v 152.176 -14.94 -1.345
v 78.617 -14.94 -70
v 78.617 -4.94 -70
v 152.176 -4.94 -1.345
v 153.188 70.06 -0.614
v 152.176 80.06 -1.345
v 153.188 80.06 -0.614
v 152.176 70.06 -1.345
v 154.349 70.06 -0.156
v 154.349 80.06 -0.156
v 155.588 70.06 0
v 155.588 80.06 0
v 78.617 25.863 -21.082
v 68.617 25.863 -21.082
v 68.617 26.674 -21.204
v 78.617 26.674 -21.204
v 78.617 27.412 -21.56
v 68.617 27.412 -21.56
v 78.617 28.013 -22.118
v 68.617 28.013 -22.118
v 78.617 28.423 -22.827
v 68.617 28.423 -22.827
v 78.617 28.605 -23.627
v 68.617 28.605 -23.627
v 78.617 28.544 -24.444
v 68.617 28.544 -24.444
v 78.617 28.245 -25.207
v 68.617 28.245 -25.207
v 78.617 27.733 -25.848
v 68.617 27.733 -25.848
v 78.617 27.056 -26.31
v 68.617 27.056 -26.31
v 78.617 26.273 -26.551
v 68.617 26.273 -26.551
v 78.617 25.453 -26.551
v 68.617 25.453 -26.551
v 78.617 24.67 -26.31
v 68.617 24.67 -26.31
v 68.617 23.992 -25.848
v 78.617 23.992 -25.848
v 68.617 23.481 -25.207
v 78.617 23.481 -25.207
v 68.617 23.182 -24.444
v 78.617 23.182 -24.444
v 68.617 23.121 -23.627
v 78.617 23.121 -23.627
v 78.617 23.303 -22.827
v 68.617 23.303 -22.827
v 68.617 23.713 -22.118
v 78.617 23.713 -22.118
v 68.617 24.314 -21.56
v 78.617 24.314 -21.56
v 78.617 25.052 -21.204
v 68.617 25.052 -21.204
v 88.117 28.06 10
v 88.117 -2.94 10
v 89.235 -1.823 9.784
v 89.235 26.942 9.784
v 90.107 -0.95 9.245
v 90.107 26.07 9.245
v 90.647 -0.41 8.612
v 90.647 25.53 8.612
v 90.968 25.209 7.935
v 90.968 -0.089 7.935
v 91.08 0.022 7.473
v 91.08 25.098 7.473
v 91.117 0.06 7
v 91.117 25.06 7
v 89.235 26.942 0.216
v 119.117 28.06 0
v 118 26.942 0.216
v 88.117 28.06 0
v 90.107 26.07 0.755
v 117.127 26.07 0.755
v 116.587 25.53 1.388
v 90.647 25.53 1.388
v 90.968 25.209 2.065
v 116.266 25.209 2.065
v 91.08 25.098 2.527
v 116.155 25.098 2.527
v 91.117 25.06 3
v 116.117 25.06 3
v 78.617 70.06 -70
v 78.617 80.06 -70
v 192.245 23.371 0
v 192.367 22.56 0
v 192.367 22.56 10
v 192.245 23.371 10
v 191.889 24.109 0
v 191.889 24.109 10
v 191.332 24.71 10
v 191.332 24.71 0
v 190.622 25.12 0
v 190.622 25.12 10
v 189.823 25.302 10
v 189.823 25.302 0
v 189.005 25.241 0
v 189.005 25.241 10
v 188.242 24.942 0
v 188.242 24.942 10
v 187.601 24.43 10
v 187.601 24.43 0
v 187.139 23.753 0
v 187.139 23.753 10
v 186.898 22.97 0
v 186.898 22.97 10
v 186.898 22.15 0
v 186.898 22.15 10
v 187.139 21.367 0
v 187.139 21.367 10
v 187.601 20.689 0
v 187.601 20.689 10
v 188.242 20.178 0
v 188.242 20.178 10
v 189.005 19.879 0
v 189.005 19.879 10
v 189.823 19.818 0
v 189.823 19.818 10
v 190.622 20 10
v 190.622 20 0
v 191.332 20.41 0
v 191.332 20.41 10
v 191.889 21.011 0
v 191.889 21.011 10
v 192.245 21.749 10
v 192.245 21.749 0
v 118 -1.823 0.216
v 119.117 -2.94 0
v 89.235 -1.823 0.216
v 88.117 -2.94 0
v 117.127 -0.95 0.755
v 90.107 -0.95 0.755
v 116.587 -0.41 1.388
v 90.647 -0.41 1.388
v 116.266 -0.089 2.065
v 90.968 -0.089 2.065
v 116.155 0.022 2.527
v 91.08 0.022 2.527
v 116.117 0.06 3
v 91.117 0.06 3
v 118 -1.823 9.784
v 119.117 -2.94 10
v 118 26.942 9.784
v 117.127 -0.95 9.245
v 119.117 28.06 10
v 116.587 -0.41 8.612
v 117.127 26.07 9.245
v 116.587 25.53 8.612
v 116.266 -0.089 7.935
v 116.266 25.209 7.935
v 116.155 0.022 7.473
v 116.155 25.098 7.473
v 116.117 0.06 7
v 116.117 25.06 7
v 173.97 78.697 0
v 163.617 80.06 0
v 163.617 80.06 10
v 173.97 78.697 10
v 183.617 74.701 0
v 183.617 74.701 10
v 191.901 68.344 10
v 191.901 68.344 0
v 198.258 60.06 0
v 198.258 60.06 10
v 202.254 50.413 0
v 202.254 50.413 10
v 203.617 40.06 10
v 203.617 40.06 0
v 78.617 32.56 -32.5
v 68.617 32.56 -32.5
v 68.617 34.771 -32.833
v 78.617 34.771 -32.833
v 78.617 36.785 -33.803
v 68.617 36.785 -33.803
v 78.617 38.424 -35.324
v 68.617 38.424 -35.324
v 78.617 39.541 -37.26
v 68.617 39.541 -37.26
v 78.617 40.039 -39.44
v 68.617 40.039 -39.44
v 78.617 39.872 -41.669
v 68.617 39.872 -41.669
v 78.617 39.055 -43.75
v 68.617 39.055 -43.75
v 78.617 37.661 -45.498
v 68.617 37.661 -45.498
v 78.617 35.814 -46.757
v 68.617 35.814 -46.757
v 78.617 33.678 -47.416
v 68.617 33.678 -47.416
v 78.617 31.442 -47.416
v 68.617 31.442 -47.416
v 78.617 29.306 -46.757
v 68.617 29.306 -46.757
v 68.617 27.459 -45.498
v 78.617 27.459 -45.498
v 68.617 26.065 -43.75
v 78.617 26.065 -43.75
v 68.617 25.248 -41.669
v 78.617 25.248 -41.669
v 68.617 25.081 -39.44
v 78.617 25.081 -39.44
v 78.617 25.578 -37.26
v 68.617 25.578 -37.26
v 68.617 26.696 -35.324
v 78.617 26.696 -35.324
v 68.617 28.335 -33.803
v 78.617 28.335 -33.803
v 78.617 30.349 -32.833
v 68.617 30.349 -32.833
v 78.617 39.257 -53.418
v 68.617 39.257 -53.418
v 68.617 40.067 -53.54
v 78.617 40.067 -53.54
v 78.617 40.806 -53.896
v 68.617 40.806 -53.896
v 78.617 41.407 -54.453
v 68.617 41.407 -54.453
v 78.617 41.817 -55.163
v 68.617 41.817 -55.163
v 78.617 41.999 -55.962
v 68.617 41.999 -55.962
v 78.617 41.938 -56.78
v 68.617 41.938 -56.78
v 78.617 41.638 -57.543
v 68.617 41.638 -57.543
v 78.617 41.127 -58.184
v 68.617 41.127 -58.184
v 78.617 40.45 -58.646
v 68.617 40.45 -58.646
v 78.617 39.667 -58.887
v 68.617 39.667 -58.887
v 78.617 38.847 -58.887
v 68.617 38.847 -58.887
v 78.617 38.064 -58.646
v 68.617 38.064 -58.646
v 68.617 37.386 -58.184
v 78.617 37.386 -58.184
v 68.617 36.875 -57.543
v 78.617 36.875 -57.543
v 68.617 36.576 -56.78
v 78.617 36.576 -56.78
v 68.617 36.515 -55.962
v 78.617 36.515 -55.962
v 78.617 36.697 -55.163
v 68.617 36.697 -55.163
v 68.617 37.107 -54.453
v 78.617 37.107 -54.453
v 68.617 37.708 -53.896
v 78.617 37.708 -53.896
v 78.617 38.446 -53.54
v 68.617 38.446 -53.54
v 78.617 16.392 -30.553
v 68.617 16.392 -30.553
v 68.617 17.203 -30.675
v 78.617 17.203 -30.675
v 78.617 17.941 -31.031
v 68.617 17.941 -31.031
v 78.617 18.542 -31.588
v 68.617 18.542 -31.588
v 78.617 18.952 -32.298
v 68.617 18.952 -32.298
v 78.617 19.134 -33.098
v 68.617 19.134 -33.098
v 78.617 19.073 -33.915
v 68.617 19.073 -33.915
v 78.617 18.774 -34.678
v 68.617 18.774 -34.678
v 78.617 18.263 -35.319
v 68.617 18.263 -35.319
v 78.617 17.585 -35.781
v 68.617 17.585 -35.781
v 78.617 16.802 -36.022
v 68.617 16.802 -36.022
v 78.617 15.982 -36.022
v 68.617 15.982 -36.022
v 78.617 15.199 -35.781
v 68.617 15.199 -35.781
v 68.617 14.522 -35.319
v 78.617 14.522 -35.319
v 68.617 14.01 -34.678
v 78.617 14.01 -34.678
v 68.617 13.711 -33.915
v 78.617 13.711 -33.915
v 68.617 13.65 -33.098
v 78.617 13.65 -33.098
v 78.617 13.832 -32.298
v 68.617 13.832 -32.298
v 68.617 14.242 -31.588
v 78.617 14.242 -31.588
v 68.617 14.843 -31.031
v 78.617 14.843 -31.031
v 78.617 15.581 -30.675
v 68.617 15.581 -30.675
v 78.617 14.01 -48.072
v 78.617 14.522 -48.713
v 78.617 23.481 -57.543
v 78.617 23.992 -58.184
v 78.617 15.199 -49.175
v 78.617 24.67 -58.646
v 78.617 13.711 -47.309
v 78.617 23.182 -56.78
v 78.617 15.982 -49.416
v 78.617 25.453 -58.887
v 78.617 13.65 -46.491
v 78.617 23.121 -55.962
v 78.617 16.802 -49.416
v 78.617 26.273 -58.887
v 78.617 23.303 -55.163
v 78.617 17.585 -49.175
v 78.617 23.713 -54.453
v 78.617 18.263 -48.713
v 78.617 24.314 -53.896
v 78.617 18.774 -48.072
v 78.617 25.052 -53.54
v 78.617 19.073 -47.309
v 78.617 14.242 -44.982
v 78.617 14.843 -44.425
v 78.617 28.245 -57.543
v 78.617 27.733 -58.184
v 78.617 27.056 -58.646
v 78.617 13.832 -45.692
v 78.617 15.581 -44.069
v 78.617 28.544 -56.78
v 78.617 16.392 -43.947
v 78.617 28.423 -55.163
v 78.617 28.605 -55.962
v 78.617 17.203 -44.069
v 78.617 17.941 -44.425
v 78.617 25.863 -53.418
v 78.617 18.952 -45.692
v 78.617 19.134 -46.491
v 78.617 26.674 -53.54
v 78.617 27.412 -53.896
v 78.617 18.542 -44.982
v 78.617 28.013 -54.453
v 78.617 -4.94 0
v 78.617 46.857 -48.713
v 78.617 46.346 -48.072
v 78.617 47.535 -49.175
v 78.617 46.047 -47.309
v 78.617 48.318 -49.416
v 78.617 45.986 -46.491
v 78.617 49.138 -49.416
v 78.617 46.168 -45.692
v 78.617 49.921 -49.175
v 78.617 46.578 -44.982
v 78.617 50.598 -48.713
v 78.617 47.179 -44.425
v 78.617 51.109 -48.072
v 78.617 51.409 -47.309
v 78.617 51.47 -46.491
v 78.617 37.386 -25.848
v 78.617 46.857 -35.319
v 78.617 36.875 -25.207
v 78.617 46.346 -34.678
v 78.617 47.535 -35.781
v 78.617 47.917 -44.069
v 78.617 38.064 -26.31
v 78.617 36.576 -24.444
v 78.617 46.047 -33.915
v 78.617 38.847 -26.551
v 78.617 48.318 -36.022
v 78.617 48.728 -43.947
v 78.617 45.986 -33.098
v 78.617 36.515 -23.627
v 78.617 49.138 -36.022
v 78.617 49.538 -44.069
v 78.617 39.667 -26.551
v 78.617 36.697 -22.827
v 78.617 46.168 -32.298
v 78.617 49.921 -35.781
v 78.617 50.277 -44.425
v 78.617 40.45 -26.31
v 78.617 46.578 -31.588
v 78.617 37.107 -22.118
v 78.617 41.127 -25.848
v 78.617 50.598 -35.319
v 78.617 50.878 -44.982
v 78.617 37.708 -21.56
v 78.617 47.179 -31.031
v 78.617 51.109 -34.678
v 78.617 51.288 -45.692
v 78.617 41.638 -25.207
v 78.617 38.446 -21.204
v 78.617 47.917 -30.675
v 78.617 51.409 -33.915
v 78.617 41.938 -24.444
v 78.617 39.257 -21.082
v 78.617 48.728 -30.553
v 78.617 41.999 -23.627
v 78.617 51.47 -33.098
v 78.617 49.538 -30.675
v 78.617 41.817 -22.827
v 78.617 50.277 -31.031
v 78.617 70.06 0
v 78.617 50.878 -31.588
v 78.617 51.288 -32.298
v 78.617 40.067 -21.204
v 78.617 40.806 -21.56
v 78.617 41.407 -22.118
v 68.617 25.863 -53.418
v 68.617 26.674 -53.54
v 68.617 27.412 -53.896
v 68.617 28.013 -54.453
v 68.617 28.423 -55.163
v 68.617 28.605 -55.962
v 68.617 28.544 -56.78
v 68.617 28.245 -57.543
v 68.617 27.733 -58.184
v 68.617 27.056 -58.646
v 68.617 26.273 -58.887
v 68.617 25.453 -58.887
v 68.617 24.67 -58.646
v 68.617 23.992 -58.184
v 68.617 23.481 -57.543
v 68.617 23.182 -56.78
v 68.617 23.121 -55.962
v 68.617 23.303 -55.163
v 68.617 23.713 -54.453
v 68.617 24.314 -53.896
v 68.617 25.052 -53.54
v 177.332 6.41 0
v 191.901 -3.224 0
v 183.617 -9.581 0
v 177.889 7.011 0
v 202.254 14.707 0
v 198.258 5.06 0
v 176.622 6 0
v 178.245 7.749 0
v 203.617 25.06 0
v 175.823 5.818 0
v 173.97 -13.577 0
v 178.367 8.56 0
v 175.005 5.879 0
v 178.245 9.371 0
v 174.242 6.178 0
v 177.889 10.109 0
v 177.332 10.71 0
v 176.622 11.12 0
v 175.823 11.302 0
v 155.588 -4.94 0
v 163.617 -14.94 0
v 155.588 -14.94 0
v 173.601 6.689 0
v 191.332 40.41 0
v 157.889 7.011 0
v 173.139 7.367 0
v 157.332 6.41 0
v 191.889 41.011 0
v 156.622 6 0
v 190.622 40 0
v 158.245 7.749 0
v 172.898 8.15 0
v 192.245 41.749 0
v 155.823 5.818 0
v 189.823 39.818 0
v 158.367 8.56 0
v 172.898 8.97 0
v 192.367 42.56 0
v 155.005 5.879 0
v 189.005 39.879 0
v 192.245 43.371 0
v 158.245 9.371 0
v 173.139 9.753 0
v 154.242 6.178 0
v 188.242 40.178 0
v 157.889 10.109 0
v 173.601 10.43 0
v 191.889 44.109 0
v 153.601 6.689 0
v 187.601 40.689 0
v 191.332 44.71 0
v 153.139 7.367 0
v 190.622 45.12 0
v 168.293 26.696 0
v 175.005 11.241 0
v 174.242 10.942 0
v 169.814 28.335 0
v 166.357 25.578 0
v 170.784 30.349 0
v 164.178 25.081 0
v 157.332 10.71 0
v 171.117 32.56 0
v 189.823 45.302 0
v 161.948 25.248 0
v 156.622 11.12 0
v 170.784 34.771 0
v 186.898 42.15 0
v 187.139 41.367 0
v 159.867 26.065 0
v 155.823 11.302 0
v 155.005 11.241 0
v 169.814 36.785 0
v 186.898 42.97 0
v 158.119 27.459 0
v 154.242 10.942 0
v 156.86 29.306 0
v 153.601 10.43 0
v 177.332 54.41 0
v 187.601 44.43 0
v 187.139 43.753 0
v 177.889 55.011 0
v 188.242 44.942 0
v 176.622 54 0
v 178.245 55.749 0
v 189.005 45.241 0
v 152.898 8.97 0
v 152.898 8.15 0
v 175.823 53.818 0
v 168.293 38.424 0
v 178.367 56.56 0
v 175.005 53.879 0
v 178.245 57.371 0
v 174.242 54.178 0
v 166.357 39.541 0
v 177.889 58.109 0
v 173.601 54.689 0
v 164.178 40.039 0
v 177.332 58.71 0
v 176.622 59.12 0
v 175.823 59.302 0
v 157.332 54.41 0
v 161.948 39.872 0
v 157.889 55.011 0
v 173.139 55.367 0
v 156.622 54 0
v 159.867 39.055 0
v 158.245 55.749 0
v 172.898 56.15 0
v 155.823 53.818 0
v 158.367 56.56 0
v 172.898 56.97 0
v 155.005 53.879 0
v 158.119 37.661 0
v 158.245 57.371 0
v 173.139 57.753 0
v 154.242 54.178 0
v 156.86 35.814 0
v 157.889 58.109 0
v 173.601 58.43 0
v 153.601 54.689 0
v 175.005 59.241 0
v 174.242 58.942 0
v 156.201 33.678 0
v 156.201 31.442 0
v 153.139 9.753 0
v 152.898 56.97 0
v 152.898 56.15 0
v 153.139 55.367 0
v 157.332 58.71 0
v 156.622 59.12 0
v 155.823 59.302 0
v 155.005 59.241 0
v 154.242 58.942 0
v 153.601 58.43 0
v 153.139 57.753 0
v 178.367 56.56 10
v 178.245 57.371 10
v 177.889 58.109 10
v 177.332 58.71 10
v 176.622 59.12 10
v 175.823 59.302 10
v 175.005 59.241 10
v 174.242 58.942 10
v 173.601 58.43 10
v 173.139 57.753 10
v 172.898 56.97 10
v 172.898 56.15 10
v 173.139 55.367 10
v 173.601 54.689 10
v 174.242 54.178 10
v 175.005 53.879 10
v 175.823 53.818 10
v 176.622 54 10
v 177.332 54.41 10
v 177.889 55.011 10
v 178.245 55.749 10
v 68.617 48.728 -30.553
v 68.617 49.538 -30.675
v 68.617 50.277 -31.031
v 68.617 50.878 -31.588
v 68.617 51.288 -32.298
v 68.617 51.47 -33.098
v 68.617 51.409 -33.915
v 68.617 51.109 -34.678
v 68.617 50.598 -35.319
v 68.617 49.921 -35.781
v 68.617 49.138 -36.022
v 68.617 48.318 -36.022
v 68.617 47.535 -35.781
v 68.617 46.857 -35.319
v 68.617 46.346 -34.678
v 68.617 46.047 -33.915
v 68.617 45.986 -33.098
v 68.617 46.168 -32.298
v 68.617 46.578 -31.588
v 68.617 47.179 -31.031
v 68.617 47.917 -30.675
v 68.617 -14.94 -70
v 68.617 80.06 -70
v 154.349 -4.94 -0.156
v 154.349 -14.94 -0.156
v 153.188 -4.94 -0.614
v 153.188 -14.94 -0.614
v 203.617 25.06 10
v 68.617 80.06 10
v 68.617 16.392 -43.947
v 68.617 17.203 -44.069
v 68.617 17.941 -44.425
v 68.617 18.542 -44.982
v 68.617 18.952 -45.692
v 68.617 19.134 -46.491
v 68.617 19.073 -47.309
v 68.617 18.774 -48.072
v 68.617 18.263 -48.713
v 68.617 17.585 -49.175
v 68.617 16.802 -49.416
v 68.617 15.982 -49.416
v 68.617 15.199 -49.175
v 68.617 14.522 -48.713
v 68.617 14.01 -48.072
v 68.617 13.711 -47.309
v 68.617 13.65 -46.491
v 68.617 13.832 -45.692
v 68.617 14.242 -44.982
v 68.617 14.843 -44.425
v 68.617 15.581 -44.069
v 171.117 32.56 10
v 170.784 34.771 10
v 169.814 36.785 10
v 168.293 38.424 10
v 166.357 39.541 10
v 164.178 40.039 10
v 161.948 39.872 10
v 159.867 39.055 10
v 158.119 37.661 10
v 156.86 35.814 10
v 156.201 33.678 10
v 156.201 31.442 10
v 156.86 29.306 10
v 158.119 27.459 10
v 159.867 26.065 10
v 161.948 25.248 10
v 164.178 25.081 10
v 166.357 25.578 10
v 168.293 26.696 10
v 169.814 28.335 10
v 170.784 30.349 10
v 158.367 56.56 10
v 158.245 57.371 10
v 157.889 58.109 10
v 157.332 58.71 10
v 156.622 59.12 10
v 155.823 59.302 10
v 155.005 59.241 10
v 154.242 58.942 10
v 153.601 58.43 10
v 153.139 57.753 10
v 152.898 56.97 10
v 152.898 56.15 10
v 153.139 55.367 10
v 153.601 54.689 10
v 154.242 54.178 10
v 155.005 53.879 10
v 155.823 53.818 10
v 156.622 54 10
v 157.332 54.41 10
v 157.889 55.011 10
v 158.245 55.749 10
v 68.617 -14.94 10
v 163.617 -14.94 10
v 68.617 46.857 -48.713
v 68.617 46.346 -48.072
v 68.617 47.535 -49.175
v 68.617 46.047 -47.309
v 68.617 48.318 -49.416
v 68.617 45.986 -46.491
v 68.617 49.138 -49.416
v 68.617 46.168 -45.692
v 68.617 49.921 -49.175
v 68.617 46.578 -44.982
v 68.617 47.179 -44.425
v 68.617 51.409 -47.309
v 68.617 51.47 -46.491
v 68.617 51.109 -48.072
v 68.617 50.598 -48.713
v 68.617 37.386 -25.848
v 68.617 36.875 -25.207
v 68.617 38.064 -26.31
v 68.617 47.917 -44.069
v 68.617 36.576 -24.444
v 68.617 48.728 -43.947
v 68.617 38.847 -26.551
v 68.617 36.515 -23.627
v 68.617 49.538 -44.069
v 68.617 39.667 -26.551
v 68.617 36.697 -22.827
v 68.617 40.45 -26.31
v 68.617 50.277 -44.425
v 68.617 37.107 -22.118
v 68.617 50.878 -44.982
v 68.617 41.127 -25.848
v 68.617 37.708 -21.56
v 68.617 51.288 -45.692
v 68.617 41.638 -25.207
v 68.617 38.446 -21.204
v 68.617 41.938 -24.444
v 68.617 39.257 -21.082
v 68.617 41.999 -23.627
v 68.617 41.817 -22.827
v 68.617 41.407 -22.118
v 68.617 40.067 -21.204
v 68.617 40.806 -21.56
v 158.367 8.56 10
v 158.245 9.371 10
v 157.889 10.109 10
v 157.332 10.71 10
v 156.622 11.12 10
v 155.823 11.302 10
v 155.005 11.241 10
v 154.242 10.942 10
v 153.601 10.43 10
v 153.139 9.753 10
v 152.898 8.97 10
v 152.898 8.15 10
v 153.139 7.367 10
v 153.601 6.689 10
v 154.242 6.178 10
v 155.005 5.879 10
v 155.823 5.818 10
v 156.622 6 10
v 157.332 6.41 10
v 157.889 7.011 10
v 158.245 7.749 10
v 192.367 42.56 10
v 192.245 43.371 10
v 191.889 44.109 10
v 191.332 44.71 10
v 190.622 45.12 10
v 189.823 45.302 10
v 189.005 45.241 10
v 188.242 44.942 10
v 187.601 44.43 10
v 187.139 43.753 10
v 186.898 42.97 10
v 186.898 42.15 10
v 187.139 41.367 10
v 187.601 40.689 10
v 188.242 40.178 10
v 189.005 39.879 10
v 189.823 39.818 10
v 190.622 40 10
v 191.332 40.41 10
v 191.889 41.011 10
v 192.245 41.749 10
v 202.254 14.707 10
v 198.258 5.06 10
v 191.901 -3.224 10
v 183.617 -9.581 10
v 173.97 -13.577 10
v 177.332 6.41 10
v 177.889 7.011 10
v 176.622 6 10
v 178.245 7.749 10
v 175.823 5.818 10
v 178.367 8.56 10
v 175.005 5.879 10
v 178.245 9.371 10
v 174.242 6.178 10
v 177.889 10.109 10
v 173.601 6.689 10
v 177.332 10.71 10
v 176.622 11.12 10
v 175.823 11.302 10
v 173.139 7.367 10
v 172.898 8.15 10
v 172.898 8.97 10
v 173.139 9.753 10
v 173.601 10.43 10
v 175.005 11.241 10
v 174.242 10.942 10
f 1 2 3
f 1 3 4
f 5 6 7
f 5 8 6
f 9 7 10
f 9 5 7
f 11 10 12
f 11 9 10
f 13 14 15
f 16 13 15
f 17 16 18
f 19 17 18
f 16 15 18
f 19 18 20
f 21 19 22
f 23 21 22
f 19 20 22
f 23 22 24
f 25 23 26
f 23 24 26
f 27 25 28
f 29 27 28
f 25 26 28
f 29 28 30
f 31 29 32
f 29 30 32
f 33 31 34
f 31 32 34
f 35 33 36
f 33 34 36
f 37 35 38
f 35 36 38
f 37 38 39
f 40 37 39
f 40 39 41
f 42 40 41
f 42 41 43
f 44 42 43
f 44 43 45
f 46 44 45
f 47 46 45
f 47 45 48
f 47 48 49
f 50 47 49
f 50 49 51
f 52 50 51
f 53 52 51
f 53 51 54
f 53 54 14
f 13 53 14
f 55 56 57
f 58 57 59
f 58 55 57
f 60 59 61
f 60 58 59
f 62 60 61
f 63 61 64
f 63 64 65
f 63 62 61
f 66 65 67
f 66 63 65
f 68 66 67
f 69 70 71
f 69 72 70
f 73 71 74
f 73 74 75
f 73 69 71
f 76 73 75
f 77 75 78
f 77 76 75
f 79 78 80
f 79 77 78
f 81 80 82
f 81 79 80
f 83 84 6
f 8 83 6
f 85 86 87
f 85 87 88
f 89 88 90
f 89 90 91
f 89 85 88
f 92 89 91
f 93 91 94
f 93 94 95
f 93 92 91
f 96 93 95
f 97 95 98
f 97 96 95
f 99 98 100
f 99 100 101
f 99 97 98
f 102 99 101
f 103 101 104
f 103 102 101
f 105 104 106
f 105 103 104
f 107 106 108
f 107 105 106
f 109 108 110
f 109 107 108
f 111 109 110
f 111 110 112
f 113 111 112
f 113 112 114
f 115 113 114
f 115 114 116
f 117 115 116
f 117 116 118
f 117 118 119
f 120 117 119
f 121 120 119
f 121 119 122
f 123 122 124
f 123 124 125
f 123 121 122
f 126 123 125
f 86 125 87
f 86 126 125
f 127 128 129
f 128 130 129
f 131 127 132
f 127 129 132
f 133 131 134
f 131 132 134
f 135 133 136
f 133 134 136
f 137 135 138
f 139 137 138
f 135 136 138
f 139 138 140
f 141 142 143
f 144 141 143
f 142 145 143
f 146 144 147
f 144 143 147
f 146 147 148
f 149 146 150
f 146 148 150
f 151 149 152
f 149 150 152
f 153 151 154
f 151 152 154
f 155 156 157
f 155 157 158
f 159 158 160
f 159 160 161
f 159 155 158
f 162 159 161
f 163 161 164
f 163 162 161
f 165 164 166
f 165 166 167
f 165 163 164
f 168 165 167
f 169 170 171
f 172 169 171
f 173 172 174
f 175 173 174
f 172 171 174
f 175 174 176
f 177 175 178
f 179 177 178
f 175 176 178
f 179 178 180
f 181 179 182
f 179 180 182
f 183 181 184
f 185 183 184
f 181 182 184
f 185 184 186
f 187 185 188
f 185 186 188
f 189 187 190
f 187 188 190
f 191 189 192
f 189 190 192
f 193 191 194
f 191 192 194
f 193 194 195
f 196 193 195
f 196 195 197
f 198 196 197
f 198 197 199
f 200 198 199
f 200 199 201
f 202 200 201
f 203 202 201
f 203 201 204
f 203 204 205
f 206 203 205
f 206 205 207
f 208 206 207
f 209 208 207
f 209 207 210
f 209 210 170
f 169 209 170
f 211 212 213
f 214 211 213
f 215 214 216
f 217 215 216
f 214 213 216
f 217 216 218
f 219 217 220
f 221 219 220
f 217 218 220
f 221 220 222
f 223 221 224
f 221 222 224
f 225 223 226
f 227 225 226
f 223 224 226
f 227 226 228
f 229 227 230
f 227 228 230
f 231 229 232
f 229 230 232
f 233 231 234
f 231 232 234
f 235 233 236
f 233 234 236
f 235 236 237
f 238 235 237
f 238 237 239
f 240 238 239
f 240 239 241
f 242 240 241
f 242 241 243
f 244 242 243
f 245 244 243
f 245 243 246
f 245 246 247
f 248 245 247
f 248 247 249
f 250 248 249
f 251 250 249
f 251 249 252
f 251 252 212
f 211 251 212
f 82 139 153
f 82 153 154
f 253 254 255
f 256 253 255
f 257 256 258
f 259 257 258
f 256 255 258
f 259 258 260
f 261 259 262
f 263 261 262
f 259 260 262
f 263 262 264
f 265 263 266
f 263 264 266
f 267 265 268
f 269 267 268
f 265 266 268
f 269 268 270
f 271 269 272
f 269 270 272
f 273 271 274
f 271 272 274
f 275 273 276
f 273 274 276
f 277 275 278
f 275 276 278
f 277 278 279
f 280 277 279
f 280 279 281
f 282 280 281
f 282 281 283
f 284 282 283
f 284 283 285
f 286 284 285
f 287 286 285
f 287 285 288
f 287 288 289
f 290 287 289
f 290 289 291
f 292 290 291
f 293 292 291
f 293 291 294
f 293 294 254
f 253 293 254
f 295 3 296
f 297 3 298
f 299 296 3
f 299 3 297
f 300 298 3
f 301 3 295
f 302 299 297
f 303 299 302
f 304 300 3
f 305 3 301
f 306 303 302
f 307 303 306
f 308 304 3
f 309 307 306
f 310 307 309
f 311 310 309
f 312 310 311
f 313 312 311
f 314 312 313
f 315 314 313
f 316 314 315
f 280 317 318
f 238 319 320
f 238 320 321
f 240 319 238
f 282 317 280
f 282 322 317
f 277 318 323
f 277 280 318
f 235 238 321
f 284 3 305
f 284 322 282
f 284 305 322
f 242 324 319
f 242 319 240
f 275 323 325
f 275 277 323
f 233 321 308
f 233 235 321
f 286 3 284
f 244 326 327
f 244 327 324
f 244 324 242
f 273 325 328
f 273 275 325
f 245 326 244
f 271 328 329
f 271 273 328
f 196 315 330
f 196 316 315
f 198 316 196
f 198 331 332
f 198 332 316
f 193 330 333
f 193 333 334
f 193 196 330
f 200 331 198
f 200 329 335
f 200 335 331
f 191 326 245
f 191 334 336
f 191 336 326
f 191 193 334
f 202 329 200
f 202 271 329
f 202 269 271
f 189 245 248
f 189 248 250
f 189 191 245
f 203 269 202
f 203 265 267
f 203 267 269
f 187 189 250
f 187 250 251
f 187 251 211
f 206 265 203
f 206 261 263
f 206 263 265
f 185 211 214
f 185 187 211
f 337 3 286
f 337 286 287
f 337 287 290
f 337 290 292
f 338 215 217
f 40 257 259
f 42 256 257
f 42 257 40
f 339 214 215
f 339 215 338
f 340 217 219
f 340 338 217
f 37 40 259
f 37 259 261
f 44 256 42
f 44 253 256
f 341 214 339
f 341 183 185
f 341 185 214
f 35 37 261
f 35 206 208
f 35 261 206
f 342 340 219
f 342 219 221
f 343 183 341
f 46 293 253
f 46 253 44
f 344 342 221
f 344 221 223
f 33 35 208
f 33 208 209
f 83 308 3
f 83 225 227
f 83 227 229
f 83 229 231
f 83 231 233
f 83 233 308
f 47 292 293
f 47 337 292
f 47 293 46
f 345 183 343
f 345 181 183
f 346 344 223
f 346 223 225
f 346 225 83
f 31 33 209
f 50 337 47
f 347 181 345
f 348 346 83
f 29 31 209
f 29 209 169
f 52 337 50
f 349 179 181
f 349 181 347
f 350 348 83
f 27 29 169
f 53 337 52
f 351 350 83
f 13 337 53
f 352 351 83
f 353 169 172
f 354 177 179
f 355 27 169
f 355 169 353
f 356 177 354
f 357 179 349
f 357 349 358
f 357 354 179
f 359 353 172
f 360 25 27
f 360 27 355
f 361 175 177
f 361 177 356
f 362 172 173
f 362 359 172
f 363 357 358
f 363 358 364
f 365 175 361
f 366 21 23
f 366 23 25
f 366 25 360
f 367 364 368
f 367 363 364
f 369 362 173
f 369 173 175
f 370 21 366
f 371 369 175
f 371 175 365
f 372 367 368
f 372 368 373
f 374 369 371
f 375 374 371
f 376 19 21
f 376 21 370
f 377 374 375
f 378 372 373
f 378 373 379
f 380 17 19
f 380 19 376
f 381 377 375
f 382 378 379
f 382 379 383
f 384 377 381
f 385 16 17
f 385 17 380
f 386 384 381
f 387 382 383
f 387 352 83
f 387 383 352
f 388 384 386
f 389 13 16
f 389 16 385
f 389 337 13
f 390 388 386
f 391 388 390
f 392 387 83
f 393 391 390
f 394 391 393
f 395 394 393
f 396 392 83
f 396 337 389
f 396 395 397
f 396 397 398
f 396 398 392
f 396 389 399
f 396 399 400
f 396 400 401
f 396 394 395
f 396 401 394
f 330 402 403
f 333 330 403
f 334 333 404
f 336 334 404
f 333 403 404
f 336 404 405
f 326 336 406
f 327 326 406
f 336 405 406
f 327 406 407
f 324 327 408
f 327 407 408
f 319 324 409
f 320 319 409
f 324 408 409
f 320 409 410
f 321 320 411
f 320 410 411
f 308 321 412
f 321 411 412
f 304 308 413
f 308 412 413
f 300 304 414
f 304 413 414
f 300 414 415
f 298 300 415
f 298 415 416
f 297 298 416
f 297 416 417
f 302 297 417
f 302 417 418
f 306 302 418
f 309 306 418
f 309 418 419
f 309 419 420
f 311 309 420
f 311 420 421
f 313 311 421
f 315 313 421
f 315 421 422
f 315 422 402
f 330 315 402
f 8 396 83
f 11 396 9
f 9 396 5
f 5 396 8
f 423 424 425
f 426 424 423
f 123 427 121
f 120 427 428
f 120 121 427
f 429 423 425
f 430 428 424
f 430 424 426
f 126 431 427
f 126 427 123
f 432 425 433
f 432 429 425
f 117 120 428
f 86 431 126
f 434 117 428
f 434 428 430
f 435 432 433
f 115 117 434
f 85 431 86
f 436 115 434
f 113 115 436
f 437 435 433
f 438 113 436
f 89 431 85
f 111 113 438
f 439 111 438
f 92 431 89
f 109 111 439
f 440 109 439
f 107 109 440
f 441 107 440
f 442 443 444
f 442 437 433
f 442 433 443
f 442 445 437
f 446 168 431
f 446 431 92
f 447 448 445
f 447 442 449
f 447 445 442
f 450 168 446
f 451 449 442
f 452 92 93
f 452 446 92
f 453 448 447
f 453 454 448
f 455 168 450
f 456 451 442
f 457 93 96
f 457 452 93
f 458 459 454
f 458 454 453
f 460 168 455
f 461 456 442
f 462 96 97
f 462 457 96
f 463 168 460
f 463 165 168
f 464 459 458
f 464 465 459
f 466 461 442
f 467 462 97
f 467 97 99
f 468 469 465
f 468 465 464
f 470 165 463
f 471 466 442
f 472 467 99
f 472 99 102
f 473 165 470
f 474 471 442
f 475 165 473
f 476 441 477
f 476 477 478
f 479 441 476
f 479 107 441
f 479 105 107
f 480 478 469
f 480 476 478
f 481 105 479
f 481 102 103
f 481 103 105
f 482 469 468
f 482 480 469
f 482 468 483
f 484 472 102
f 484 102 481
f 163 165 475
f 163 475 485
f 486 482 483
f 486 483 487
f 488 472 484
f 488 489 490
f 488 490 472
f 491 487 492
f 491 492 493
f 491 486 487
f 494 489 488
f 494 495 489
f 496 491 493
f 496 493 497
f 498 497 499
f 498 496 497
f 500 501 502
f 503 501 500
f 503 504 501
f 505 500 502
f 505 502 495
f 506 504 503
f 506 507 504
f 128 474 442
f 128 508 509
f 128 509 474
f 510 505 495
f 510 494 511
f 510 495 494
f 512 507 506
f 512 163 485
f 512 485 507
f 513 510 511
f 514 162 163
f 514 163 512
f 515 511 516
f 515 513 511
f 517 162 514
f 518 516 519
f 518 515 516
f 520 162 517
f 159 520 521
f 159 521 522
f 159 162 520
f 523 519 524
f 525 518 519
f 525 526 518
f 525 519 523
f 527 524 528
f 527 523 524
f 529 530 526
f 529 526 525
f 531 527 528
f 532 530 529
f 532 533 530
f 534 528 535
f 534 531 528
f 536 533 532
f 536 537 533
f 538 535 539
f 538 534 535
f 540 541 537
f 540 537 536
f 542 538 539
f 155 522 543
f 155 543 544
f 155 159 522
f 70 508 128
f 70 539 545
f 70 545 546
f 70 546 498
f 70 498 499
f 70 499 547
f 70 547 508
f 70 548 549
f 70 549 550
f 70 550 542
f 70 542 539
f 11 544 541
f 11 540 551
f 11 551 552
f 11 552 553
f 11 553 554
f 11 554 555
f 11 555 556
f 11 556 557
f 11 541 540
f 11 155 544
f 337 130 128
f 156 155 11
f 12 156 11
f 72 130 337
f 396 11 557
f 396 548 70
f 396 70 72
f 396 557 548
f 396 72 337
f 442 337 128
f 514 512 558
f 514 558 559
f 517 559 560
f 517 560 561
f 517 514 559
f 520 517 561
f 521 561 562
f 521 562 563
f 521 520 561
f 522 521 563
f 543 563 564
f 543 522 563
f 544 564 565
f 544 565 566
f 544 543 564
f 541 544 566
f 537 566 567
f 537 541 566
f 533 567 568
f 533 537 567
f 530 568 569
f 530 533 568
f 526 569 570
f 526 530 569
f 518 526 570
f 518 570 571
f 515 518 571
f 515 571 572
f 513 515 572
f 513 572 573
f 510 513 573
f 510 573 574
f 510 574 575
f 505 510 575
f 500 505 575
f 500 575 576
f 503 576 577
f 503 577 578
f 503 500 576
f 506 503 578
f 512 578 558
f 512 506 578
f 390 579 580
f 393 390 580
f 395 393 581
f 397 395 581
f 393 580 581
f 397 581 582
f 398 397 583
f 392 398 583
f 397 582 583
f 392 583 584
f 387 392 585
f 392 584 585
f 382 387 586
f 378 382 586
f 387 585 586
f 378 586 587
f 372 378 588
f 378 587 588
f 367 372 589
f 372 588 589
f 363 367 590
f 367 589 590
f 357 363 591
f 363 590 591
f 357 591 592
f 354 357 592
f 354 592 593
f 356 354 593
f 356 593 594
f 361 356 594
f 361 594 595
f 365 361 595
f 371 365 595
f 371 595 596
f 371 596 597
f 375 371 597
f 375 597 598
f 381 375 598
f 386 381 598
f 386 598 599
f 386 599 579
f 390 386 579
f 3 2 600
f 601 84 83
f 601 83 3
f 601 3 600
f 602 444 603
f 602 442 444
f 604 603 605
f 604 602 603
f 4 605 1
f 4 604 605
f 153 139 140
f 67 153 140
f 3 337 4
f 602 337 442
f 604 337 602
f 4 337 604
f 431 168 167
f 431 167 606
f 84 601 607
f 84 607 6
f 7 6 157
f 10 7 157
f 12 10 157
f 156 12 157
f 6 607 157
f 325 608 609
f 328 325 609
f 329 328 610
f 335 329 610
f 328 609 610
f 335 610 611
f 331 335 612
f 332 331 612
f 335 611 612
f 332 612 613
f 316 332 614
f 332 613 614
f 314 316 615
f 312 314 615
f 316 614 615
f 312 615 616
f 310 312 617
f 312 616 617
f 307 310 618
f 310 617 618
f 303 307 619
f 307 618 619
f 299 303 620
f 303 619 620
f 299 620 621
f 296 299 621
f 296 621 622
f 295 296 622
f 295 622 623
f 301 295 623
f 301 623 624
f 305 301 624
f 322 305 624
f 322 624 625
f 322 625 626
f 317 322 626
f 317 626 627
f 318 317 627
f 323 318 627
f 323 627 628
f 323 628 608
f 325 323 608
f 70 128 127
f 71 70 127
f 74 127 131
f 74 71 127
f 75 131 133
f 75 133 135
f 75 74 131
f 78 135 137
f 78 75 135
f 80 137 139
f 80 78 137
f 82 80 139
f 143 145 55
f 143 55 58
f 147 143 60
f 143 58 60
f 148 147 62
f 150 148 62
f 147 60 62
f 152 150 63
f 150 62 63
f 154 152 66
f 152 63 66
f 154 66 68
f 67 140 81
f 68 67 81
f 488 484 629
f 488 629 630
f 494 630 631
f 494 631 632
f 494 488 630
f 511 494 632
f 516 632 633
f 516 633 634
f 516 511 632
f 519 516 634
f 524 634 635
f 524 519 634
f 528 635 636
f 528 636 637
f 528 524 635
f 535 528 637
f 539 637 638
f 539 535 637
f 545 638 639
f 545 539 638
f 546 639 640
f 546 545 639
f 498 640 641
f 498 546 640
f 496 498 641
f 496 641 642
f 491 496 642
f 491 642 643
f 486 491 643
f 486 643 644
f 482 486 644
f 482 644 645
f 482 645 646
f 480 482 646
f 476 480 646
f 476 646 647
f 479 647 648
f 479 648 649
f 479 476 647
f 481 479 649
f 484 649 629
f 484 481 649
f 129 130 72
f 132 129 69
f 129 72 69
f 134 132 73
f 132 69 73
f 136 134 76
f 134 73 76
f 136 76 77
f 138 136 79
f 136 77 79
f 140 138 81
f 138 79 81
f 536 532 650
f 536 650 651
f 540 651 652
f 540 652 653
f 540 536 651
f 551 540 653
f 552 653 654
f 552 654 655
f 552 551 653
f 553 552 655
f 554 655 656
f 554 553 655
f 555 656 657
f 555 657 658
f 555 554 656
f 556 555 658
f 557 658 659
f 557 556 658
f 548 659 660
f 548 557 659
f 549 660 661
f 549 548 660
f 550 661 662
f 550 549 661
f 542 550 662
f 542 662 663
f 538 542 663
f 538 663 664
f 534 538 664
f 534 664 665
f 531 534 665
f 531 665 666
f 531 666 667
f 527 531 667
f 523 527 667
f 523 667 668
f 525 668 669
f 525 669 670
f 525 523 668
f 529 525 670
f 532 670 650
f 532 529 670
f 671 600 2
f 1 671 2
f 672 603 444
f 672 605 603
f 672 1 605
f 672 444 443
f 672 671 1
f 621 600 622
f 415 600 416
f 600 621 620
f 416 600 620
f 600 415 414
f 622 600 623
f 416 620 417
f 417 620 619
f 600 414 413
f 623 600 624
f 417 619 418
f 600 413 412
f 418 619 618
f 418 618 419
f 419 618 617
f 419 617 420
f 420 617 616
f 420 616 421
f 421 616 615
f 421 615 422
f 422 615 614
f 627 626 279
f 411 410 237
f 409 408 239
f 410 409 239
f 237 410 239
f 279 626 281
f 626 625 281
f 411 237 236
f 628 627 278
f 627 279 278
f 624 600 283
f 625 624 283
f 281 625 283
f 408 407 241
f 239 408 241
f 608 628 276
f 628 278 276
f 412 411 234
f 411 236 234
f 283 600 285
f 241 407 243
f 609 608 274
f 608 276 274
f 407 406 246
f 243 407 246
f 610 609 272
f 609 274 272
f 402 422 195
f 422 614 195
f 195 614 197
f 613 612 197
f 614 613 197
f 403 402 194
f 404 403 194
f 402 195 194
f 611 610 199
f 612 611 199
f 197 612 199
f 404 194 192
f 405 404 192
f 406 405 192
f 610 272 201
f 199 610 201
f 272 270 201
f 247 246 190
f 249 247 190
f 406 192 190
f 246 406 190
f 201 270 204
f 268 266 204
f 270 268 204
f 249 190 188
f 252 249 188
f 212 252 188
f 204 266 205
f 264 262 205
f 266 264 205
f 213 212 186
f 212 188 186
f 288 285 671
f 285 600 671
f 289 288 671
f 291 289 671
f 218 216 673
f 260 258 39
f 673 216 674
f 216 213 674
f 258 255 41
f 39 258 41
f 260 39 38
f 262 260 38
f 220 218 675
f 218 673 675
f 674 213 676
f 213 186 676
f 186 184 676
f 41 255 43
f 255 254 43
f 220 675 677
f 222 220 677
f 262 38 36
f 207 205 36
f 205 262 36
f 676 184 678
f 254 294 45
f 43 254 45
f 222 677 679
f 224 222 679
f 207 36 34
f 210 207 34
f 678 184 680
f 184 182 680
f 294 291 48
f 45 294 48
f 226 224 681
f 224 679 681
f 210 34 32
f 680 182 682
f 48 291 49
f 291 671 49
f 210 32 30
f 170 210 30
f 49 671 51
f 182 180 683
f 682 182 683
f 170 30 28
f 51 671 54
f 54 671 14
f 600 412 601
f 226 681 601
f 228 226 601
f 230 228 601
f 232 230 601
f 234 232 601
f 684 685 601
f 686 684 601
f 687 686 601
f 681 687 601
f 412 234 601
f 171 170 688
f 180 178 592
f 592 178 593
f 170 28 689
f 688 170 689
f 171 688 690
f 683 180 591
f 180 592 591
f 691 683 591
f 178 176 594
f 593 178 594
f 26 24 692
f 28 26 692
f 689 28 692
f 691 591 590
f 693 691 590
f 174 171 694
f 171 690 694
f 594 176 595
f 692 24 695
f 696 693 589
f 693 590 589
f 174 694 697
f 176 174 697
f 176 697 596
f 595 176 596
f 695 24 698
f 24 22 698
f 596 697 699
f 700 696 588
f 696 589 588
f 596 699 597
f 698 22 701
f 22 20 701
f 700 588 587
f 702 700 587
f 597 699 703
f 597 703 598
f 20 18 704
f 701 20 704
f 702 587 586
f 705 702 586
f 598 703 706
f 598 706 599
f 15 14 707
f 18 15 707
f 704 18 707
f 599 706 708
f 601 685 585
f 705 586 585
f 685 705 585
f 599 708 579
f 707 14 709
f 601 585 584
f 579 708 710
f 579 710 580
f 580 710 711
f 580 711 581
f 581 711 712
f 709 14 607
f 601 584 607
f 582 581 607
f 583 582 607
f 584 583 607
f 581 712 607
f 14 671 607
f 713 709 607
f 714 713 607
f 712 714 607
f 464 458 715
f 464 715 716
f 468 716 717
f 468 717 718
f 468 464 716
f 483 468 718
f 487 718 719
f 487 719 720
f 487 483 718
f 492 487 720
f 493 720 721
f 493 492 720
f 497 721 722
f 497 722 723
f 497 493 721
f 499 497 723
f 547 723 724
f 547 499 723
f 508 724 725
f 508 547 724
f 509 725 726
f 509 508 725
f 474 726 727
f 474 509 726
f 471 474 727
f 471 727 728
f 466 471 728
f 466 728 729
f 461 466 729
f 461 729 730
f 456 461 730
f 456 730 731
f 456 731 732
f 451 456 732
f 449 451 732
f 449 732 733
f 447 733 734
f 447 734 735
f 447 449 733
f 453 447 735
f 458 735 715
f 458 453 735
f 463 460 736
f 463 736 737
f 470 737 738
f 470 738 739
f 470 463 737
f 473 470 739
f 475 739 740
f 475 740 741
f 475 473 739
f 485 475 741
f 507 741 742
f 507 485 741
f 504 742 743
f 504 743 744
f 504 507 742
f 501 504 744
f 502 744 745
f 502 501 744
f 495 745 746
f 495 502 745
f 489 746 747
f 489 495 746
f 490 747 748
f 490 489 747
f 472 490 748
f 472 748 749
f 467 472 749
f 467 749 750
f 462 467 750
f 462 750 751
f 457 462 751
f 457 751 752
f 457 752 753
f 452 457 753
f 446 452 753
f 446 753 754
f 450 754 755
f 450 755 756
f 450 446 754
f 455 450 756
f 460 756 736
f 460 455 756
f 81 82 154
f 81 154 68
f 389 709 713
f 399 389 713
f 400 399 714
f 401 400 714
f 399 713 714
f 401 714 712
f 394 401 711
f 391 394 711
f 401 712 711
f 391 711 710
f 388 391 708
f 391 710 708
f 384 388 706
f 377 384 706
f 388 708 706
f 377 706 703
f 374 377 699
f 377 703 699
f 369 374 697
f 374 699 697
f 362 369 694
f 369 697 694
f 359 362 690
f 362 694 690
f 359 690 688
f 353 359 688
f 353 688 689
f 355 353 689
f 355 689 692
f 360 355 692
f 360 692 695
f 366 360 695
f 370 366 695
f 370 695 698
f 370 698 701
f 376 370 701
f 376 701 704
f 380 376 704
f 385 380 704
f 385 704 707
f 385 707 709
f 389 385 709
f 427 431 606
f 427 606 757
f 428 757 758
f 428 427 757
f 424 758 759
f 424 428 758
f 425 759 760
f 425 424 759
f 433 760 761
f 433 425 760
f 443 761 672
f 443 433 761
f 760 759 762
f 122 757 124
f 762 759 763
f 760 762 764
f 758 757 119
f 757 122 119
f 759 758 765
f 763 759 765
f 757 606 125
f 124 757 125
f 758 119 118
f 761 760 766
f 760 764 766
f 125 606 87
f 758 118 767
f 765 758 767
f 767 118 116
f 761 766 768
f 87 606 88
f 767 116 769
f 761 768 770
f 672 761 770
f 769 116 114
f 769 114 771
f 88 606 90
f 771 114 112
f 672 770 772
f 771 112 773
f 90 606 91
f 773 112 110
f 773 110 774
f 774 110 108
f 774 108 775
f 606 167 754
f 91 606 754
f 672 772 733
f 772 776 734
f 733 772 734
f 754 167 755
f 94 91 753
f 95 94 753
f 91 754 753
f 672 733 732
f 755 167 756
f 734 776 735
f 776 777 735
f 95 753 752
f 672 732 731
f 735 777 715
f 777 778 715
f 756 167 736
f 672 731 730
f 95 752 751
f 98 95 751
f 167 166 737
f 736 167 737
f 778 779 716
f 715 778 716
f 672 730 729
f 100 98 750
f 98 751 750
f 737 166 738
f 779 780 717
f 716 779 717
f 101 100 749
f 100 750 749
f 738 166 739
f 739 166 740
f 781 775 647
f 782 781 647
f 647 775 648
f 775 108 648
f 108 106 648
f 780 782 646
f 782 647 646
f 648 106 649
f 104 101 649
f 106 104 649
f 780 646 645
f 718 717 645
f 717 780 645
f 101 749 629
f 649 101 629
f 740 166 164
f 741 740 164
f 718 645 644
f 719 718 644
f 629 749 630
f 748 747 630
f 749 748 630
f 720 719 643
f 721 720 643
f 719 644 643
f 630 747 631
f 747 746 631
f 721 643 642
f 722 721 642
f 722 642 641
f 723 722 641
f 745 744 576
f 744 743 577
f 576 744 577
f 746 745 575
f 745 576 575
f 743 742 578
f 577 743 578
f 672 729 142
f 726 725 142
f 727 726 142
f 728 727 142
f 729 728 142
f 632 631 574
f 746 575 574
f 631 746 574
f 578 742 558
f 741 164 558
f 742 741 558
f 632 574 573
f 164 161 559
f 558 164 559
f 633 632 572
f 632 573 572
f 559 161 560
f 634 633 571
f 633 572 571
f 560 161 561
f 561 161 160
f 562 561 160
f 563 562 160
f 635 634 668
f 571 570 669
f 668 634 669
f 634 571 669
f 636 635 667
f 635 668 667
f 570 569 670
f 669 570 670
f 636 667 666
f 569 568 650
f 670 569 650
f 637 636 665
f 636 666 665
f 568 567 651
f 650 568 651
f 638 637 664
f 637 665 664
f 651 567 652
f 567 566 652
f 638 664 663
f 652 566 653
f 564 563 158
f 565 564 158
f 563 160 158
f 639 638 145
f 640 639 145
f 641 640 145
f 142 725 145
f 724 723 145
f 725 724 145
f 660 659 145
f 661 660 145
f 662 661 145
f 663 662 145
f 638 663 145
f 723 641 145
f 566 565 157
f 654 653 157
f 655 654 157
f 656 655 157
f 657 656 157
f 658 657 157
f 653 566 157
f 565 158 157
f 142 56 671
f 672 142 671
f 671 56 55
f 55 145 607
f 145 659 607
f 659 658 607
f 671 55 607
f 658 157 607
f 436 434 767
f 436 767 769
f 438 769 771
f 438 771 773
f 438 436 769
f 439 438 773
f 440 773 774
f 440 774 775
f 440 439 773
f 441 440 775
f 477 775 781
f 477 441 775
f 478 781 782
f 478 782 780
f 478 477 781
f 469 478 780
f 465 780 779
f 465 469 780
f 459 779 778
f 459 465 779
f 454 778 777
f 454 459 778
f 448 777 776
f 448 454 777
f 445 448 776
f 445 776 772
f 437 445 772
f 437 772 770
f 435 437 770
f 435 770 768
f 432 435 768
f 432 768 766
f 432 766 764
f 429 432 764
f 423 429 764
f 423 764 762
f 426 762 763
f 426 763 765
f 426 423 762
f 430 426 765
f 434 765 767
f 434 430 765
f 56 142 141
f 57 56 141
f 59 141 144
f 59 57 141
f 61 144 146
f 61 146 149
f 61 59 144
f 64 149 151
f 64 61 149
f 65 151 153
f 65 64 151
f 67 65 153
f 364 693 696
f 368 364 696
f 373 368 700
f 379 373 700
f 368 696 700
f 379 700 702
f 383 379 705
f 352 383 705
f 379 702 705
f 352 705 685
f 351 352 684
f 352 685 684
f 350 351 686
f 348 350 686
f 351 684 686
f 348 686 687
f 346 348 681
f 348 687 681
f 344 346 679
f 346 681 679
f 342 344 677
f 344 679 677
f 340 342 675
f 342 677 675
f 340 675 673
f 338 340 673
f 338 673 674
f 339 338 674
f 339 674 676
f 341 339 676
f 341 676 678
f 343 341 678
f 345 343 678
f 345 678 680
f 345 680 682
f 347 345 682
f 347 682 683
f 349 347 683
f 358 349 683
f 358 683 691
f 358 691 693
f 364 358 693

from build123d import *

# Parameters (mm, degrees)
SKETCH3_R           = 7.5
SKETCH3_R_2         = 2.75
BOSS_EXTRUDE1_DEPTH = 10
SKETCH4_W           = 10
SKETCH4_H           = 95
BOSS_EXTRUDE2_DEPTH = 70
SKETCH8_R           = 7.5
SKETCH8_R_2         = 2.75
CUT_EXTRUDE2_DEPTH  = 43.8
BOSS_EXTRUDE3_DEPTH = 10
FILLET1_R           = 5
SKETCH11_W          = 25
SKETCH11_H          = 25
CUT_EXTRUDE3_DEPTH  = 11
FILLET3_R           = 3


with BuildPart() as part:
    # Sketch3 → Boss-Extrude1 (new body)
    with BuildSketch(Plane.XY):
        with BuildLine():
            Line((68.617133813, 80.05993294), (163.617133813, 80.05993294))
            ThreePointArc((163.617133813, 80.05993294), (191.90140506, 68.344204188), (203.617133813, 40.05993294))
            Line((203.617133813, 40.05993294), (203.617133813, 25.05993294))
            ThreePointArc((203.617133813, 25.05993294), (191.90140506, -3.224338307), (163.617133813, -14.94006706))
            Line((163.617133813, -14.94006706), (68.617133813, -14.94006706))
            Line((68.617133813, -14.94006706), (68.617133813, 80.05993294))
        make_face()
        with Locations((163.617133813, 32.55993294)):
            Circle(SKETCH3_R, mode=Mode.SUBTRACT)
        with Locations((189.617133813, 42.55993294)):
            Circle(SKETCH3_R_2, mode=Mode.SUBTRACT)
        with Locations((155.617133813, 56.55993294)):
            Circle(SKETCH3_R_2, mode=Mode.SUBTRACT)
        with Locations((175.617133813, 56.55993294)):
            Circle(SKETCH3_R_2, mode=Mode.SUBTRACT)
        with Locations((155.617133813, 8.55993294)):
            Circle(SKETCH3_R_2, mode=Mode.SUBTRACT)
        with Locations((175.617133813, 8.55993294)):
            Circle(SKETCH3_R_2, mode=Mode.SUBTRACT)
        with Locations((189.617133813, 22.55993294)):
            Circle(SKETCH3_R_2, mode=Mode.SUBTRACT)
    extrude(amount=BOSS_EXTRUDE1_DEPTH)

    # Sketch4 → Boss-Extrude2 (add)
    with BuildSketch(Plane(origin=(0, 0, 0), x_dir=(-1, 0, 0), z_dir=(0, 0, -1))):
        with Locations((-73.617133813, 32.55993294)):
            Rectangle(SKETCH4_W, SKETCH4_H)
    extrude(amount=BOSS_EXTRUDE2_DEPTH)

    # Sketch8 → Cut-Extrude2 (cut)
    with BuildSketch(Plane.ZY.offset(-68.617133813)):
        with Locations((-40, 32.55993294)):
            Circle(SKETCH8_R)
        with Locations((-56.167891819, 25.862972874)):
            Circle(SKETCH8_R_2)
        with Locations((-56.167891819, 39.256893006)):
            Circle(SKETCH8_R_2)
        with Locations((-46.696960066, 48.727824759)):
            Circle(SKETCH8_R_2)
        with Locations((-33.303039934, 48.727824759)):
            Circle(SKETCH8_R_2)
        with Locations((-23.832108181, 39.256893006)):
            Circle(SKETCH8_R_2)
        with Locations((-23.832108181, 25.862972874)):
            Circle(SKETCH8_R_2)
        with Locations((-33.303039934, 16.392041121)):
            Circle(SKETCH8_R_2)
        with Locations((-46.696960066, 16.392041121)):
            Circle(SKETCH8_R_2)
    extrude(amount=-CUT_EXTRUDE2_DEPTH, mode=Mode.SUBTRACT)

    # Sketch9 → Boss-Extrude3 (add)
    with BuildSketch(Plane.XZ.offset(14.94006706)):
        Polygon((78.617133813, -70), (153.617133813, 0), (78.617133813, 0), align=None)
    boss_extrude3 = extrude(amount=-BOSS_EXTRUDE3_DEPTH)

    # Mirror1: Boss-Extrude3 across plane
    add(boss_extrude3.mirror(Plane(origin=(0, 32.55993294, 0), x_dir=(0, 0, 1), z_dir=(0, -1, 0))))

    # Fillet1
    fillet1_edges = [part.edges().sort_by_distance(p)[0] for p in [
        (153.617133813, -9.94006706, 0),
        (153.617133813, 75.05993294, 0),
    ]]
    fillet(fillet1_edges, radius=FILLET1_R)

    # Sketch11 → Cut-Extrude3 (cut, through all)
    with BuildSketch(Plane(origin=(0, 0, 0), x_dir=(-1, 0, 0), z_dir=(0, 0, -1))):
        with Locations((-103.617133813, 12.55993294)):
            Rectangle(SKETCH11_W, SKETCH11_H)
    extrude(amount=-CUT_EXTRUDE3_DEPTH, mode=Mode.SUBTRACT)

    # Fillet3
    fillet3_edges = [part.edges().sort_by_distance(p)[0] for p in [
        (91.117133813, 12.55993294, 10),
        (103.617133813, 0.05993294, 10),
        (116.117133813, 12.55993294, 10),
        (103.617133813, 25.05993294, 10),
        (91.117133813, 12.55993294, 0),
        (103.617133813, 25.05993294, 0),
        (116.117133813, 12.55993294, 0),
        (103.617133813, 0.05993294, 0),
    ]]
    fillet(fillet3_edges, radius=FILLET3_R)


solid = part.part
